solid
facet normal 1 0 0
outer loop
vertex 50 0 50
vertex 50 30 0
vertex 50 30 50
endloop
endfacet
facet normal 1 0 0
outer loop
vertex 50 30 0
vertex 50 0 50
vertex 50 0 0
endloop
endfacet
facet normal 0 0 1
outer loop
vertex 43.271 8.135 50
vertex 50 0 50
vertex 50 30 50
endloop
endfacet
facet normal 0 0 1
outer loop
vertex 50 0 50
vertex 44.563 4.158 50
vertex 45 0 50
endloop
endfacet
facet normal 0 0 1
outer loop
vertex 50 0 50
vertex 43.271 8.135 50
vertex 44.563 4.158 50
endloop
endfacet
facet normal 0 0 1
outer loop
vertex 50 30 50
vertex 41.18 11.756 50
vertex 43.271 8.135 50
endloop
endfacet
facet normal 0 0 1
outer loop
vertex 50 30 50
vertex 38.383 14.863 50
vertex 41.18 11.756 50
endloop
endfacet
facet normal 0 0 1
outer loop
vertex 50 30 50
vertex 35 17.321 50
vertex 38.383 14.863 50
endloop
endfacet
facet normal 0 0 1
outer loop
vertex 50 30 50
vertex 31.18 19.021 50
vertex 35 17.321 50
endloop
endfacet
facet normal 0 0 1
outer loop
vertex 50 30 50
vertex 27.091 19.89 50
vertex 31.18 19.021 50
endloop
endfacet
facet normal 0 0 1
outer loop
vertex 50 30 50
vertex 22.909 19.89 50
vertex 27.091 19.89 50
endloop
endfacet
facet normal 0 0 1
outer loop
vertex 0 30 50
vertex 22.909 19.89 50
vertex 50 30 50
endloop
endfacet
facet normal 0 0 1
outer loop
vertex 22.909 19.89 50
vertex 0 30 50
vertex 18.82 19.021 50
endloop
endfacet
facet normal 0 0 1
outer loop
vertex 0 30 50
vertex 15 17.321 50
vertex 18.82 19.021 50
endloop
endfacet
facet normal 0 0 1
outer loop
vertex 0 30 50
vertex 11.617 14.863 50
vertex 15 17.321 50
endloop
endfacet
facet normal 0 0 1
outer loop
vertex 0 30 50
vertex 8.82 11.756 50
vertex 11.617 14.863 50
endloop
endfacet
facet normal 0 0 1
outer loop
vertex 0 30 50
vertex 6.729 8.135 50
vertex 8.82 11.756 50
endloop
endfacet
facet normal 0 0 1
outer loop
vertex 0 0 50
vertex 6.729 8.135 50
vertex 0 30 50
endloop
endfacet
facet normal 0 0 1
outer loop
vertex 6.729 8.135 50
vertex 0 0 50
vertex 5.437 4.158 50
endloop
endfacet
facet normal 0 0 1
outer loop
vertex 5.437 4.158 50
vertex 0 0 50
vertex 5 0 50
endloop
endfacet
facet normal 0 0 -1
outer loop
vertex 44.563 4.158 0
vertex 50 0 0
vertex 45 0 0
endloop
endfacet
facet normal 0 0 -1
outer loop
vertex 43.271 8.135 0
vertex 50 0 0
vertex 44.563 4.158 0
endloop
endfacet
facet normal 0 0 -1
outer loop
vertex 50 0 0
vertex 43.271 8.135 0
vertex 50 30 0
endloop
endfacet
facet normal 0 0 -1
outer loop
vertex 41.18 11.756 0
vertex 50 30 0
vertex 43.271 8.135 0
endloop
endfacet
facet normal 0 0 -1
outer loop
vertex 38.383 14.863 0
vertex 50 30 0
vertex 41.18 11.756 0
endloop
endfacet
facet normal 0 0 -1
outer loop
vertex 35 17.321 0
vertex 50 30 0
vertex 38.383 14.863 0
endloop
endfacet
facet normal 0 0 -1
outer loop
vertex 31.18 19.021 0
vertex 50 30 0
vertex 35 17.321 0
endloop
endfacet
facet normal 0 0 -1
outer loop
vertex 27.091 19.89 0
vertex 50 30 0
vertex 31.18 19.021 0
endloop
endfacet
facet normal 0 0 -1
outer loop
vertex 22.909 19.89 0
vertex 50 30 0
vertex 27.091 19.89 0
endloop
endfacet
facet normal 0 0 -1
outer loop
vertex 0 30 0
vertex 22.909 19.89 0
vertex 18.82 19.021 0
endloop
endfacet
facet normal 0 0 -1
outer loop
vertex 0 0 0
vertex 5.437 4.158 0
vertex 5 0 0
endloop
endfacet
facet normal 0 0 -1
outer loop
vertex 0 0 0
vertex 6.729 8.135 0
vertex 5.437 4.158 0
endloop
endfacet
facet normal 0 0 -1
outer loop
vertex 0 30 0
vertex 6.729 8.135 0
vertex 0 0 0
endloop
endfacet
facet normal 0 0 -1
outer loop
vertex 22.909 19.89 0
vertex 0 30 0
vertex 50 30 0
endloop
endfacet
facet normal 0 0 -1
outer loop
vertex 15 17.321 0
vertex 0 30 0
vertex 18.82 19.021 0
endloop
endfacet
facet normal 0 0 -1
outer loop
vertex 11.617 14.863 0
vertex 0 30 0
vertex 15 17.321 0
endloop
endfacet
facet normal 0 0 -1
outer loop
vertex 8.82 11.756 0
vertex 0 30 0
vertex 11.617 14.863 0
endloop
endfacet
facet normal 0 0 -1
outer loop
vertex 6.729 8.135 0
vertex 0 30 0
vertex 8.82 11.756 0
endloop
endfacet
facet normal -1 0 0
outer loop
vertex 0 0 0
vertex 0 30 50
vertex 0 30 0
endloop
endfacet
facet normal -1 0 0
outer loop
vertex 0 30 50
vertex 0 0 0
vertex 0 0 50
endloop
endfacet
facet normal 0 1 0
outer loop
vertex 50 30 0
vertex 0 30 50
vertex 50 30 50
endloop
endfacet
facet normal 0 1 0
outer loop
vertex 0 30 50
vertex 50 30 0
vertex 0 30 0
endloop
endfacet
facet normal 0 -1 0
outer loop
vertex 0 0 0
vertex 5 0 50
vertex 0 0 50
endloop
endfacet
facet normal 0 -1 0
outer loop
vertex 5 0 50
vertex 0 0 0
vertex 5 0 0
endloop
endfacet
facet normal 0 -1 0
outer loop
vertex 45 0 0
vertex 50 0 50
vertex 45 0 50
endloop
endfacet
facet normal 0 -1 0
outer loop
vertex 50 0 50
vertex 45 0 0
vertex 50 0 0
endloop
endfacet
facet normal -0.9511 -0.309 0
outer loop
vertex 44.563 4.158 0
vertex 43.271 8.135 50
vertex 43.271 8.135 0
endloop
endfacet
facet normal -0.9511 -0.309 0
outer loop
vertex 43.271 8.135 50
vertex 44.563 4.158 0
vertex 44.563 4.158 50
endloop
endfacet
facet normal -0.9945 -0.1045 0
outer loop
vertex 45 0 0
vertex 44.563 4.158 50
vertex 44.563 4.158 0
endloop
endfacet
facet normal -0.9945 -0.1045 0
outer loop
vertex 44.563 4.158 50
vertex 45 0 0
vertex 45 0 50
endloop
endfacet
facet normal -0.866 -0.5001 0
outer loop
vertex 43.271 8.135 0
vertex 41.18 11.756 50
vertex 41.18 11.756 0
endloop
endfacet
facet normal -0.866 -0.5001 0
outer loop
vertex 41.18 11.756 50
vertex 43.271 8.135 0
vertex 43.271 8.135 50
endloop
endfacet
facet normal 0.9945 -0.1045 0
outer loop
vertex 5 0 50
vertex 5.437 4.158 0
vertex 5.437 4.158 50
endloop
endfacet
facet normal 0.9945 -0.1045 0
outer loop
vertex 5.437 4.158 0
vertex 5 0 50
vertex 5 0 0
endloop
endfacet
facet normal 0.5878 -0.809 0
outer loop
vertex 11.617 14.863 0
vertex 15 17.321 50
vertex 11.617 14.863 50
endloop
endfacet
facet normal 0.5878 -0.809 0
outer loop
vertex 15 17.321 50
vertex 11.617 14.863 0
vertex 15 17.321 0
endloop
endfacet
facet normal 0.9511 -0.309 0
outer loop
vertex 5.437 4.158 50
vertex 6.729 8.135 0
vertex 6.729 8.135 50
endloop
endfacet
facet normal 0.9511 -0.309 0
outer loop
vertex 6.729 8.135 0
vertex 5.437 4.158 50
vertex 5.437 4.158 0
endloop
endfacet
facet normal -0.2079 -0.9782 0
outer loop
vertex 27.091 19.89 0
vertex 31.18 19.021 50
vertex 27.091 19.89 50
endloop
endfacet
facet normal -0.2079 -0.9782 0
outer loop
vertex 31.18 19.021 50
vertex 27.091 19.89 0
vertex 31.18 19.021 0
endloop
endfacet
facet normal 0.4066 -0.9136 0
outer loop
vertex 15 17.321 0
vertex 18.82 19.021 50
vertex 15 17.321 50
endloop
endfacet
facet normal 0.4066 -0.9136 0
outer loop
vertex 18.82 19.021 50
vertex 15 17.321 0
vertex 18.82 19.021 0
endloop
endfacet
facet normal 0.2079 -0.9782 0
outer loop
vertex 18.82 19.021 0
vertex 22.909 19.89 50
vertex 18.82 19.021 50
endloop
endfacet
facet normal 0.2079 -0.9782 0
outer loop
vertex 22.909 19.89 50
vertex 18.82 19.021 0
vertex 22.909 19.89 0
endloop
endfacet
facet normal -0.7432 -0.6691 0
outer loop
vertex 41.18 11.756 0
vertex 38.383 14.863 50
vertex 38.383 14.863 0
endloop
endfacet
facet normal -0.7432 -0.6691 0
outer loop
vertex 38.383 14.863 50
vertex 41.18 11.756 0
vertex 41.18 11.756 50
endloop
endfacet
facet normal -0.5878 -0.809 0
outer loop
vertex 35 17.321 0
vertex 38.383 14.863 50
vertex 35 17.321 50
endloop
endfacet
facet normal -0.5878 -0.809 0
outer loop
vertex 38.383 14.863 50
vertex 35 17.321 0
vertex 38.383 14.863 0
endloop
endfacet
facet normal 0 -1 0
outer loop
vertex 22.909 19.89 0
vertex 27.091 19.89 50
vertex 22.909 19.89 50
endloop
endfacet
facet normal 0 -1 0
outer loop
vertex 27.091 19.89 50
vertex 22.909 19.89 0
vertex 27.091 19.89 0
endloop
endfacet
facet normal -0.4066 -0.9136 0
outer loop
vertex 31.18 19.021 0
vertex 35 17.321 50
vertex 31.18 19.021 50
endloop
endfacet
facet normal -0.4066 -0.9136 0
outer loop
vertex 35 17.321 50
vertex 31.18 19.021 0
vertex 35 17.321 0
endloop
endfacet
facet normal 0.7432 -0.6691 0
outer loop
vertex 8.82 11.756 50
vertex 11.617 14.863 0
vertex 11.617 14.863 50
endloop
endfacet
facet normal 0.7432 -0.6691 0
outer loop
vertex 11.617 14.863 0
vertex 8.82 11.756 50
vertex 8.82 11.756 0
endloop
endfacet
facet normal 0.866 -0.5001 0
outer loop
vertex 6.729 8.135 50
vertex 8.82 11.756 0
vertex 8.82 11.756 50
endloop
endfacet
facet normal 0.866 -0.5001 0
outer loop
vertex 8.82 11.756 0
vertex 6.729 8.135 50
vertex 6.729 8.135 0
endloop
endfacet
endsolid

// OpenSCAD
difference() {
    cube([50, 30, 50]);
    translate([25, 0, -1]) cylinder(h=60, r1=20, r2=20);
}
